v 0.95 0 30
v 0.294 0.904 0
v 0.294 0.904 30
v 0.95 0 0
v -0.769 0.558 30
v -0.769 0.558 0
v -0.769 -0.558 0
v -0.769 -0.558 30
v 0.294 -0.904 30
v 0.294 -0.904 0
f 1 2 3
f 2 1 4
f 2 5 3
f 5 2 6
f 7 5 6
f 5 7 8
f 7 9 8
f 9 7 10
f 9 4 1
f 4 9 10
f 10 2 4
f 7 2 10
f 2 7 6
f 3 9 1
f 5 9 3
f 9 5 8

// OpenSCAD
module stylus() {
    cylinder(r=1.9/2, h=30);
}

stylus();
